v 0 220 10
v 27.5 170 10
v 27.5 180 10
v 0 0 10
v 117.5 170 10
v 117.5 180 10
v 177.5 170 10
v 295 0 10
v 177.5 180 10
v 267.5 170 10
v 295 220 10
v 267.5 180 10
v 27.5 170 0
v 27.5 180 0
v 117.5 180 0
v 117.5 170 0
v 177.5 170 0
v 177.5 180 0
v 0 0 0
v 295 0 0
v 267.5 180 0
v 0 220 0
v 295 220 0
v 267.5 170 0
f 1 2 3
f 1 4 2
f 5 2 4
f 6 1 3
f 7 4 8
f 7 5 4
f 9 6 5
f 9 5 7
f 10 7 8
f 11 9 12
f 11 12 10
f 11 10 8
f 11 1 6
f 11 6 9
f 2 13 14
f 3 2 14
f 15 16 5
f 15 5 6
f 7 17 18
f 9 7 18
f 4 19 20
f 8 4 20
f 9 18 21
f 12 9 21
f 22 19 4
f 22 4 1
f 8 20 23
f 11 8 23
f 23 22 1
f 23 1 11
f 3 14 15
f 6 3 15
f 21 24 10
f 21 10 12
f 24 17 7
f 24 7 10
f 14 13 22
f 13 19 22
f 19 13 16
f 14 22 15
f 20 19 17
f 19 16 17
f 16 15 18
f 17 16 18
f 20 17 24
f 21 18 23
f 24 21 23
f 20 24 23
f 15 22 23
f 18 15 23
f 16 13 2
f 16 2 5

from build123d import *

# Parameters (mm, degrees)
ESQUISSE1_W        = 295
ESQUISSE1_H        = 220
ESQUISSE1_W_2      = 90
ESQUISSE1_H_2      = 10
BOSS_EXTRU_1_DEPTH = 10


with BuildPart() as part:
    # Esquisse1 → Boss.-Extru.1 (new body)
    with BuildSketch(Plane.XY):
        with Locations((147.5, 110)):
            Rectangle(ESQUISSE1_W, ESQUISSE1_H)
        with Locations((72.5, 175)):
            Rectangle(ESQUISSE1_W_2, ESQUISSE1_H_2, mode=Mode.SUBTRACT)
        with Locations((222.5, 175)):
            Rectangle(ESQUISSE1_W_2, ESQUISSE1_H_2, mode=Mode.SUBTRACT)
    extrude(amount=BOSS_EXTRU_1_DEPTH)


solid = part.part
